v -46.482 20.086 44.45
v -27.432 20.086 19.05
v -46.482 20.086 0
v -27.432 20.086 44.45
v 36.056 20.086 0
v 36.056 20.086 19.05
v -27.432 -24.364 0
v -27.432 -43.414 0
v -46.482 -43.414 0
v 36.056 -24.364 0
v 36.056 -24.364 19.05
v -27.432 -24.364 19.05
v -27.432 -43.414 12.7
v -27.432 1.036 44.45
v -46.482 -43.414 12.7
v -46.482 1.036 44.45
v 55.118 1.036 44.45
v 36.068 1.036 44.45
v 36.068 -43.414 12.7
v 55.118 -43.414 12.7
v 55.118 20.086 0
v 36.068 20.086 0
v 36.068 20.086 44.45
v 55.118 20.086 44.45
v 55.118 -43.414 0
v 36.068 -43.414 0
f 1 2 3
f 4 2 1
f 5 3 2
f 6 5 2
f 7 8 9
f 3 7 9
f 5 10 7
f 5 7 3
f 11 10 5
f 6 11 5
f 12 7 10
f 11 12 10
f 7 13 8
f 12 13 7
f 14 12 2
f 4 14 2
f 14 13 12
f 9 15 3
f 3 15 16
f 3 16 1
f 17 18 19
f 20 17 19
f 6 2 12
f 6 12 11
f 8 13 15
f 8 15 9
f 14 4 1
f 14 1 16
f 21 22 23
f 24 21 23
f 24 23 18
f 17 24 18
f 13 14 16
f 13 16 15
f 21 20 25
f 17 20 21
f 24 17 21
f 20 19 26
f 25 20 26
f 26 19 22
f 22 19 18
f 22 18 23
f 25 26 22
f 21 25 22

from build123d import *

# Parameters (mm, degrees)
F0_W     = 63.5
F0_H     = 44.45
F1_DEPTH = 19.05
F5_DEPTH = 19.05


with BuildPart() as f1:
    # F0 (on Top) → F1 (new body)
    with BuildSketch(Plane.XY):
        with Locations((4.306299, -2.139304)):
            Rectangle(F0_W, F0_H)
    extrude(amount=F1_DEPTH)

    # F6: F5 across plane


with BuildPart() as f5:
    # F3 (on offset) → F5 (new body)
    with BuildSketch(Plane.YZ.offset(36.068)):
        Polygon((-43.414304, 0), (20.085696, 0), (20.085696, 44.45), (1.035696, 44.45), (-43.414304, 12.7), align=None)
    extrude(amount=F5_DEPTH)


with BuildPart() as f1_1:
    add(f1.part)
    add(f5.part.mirror(Plane.YZ.offset(4.318)))


solid = Compound([f5.part, f1_1.part])
